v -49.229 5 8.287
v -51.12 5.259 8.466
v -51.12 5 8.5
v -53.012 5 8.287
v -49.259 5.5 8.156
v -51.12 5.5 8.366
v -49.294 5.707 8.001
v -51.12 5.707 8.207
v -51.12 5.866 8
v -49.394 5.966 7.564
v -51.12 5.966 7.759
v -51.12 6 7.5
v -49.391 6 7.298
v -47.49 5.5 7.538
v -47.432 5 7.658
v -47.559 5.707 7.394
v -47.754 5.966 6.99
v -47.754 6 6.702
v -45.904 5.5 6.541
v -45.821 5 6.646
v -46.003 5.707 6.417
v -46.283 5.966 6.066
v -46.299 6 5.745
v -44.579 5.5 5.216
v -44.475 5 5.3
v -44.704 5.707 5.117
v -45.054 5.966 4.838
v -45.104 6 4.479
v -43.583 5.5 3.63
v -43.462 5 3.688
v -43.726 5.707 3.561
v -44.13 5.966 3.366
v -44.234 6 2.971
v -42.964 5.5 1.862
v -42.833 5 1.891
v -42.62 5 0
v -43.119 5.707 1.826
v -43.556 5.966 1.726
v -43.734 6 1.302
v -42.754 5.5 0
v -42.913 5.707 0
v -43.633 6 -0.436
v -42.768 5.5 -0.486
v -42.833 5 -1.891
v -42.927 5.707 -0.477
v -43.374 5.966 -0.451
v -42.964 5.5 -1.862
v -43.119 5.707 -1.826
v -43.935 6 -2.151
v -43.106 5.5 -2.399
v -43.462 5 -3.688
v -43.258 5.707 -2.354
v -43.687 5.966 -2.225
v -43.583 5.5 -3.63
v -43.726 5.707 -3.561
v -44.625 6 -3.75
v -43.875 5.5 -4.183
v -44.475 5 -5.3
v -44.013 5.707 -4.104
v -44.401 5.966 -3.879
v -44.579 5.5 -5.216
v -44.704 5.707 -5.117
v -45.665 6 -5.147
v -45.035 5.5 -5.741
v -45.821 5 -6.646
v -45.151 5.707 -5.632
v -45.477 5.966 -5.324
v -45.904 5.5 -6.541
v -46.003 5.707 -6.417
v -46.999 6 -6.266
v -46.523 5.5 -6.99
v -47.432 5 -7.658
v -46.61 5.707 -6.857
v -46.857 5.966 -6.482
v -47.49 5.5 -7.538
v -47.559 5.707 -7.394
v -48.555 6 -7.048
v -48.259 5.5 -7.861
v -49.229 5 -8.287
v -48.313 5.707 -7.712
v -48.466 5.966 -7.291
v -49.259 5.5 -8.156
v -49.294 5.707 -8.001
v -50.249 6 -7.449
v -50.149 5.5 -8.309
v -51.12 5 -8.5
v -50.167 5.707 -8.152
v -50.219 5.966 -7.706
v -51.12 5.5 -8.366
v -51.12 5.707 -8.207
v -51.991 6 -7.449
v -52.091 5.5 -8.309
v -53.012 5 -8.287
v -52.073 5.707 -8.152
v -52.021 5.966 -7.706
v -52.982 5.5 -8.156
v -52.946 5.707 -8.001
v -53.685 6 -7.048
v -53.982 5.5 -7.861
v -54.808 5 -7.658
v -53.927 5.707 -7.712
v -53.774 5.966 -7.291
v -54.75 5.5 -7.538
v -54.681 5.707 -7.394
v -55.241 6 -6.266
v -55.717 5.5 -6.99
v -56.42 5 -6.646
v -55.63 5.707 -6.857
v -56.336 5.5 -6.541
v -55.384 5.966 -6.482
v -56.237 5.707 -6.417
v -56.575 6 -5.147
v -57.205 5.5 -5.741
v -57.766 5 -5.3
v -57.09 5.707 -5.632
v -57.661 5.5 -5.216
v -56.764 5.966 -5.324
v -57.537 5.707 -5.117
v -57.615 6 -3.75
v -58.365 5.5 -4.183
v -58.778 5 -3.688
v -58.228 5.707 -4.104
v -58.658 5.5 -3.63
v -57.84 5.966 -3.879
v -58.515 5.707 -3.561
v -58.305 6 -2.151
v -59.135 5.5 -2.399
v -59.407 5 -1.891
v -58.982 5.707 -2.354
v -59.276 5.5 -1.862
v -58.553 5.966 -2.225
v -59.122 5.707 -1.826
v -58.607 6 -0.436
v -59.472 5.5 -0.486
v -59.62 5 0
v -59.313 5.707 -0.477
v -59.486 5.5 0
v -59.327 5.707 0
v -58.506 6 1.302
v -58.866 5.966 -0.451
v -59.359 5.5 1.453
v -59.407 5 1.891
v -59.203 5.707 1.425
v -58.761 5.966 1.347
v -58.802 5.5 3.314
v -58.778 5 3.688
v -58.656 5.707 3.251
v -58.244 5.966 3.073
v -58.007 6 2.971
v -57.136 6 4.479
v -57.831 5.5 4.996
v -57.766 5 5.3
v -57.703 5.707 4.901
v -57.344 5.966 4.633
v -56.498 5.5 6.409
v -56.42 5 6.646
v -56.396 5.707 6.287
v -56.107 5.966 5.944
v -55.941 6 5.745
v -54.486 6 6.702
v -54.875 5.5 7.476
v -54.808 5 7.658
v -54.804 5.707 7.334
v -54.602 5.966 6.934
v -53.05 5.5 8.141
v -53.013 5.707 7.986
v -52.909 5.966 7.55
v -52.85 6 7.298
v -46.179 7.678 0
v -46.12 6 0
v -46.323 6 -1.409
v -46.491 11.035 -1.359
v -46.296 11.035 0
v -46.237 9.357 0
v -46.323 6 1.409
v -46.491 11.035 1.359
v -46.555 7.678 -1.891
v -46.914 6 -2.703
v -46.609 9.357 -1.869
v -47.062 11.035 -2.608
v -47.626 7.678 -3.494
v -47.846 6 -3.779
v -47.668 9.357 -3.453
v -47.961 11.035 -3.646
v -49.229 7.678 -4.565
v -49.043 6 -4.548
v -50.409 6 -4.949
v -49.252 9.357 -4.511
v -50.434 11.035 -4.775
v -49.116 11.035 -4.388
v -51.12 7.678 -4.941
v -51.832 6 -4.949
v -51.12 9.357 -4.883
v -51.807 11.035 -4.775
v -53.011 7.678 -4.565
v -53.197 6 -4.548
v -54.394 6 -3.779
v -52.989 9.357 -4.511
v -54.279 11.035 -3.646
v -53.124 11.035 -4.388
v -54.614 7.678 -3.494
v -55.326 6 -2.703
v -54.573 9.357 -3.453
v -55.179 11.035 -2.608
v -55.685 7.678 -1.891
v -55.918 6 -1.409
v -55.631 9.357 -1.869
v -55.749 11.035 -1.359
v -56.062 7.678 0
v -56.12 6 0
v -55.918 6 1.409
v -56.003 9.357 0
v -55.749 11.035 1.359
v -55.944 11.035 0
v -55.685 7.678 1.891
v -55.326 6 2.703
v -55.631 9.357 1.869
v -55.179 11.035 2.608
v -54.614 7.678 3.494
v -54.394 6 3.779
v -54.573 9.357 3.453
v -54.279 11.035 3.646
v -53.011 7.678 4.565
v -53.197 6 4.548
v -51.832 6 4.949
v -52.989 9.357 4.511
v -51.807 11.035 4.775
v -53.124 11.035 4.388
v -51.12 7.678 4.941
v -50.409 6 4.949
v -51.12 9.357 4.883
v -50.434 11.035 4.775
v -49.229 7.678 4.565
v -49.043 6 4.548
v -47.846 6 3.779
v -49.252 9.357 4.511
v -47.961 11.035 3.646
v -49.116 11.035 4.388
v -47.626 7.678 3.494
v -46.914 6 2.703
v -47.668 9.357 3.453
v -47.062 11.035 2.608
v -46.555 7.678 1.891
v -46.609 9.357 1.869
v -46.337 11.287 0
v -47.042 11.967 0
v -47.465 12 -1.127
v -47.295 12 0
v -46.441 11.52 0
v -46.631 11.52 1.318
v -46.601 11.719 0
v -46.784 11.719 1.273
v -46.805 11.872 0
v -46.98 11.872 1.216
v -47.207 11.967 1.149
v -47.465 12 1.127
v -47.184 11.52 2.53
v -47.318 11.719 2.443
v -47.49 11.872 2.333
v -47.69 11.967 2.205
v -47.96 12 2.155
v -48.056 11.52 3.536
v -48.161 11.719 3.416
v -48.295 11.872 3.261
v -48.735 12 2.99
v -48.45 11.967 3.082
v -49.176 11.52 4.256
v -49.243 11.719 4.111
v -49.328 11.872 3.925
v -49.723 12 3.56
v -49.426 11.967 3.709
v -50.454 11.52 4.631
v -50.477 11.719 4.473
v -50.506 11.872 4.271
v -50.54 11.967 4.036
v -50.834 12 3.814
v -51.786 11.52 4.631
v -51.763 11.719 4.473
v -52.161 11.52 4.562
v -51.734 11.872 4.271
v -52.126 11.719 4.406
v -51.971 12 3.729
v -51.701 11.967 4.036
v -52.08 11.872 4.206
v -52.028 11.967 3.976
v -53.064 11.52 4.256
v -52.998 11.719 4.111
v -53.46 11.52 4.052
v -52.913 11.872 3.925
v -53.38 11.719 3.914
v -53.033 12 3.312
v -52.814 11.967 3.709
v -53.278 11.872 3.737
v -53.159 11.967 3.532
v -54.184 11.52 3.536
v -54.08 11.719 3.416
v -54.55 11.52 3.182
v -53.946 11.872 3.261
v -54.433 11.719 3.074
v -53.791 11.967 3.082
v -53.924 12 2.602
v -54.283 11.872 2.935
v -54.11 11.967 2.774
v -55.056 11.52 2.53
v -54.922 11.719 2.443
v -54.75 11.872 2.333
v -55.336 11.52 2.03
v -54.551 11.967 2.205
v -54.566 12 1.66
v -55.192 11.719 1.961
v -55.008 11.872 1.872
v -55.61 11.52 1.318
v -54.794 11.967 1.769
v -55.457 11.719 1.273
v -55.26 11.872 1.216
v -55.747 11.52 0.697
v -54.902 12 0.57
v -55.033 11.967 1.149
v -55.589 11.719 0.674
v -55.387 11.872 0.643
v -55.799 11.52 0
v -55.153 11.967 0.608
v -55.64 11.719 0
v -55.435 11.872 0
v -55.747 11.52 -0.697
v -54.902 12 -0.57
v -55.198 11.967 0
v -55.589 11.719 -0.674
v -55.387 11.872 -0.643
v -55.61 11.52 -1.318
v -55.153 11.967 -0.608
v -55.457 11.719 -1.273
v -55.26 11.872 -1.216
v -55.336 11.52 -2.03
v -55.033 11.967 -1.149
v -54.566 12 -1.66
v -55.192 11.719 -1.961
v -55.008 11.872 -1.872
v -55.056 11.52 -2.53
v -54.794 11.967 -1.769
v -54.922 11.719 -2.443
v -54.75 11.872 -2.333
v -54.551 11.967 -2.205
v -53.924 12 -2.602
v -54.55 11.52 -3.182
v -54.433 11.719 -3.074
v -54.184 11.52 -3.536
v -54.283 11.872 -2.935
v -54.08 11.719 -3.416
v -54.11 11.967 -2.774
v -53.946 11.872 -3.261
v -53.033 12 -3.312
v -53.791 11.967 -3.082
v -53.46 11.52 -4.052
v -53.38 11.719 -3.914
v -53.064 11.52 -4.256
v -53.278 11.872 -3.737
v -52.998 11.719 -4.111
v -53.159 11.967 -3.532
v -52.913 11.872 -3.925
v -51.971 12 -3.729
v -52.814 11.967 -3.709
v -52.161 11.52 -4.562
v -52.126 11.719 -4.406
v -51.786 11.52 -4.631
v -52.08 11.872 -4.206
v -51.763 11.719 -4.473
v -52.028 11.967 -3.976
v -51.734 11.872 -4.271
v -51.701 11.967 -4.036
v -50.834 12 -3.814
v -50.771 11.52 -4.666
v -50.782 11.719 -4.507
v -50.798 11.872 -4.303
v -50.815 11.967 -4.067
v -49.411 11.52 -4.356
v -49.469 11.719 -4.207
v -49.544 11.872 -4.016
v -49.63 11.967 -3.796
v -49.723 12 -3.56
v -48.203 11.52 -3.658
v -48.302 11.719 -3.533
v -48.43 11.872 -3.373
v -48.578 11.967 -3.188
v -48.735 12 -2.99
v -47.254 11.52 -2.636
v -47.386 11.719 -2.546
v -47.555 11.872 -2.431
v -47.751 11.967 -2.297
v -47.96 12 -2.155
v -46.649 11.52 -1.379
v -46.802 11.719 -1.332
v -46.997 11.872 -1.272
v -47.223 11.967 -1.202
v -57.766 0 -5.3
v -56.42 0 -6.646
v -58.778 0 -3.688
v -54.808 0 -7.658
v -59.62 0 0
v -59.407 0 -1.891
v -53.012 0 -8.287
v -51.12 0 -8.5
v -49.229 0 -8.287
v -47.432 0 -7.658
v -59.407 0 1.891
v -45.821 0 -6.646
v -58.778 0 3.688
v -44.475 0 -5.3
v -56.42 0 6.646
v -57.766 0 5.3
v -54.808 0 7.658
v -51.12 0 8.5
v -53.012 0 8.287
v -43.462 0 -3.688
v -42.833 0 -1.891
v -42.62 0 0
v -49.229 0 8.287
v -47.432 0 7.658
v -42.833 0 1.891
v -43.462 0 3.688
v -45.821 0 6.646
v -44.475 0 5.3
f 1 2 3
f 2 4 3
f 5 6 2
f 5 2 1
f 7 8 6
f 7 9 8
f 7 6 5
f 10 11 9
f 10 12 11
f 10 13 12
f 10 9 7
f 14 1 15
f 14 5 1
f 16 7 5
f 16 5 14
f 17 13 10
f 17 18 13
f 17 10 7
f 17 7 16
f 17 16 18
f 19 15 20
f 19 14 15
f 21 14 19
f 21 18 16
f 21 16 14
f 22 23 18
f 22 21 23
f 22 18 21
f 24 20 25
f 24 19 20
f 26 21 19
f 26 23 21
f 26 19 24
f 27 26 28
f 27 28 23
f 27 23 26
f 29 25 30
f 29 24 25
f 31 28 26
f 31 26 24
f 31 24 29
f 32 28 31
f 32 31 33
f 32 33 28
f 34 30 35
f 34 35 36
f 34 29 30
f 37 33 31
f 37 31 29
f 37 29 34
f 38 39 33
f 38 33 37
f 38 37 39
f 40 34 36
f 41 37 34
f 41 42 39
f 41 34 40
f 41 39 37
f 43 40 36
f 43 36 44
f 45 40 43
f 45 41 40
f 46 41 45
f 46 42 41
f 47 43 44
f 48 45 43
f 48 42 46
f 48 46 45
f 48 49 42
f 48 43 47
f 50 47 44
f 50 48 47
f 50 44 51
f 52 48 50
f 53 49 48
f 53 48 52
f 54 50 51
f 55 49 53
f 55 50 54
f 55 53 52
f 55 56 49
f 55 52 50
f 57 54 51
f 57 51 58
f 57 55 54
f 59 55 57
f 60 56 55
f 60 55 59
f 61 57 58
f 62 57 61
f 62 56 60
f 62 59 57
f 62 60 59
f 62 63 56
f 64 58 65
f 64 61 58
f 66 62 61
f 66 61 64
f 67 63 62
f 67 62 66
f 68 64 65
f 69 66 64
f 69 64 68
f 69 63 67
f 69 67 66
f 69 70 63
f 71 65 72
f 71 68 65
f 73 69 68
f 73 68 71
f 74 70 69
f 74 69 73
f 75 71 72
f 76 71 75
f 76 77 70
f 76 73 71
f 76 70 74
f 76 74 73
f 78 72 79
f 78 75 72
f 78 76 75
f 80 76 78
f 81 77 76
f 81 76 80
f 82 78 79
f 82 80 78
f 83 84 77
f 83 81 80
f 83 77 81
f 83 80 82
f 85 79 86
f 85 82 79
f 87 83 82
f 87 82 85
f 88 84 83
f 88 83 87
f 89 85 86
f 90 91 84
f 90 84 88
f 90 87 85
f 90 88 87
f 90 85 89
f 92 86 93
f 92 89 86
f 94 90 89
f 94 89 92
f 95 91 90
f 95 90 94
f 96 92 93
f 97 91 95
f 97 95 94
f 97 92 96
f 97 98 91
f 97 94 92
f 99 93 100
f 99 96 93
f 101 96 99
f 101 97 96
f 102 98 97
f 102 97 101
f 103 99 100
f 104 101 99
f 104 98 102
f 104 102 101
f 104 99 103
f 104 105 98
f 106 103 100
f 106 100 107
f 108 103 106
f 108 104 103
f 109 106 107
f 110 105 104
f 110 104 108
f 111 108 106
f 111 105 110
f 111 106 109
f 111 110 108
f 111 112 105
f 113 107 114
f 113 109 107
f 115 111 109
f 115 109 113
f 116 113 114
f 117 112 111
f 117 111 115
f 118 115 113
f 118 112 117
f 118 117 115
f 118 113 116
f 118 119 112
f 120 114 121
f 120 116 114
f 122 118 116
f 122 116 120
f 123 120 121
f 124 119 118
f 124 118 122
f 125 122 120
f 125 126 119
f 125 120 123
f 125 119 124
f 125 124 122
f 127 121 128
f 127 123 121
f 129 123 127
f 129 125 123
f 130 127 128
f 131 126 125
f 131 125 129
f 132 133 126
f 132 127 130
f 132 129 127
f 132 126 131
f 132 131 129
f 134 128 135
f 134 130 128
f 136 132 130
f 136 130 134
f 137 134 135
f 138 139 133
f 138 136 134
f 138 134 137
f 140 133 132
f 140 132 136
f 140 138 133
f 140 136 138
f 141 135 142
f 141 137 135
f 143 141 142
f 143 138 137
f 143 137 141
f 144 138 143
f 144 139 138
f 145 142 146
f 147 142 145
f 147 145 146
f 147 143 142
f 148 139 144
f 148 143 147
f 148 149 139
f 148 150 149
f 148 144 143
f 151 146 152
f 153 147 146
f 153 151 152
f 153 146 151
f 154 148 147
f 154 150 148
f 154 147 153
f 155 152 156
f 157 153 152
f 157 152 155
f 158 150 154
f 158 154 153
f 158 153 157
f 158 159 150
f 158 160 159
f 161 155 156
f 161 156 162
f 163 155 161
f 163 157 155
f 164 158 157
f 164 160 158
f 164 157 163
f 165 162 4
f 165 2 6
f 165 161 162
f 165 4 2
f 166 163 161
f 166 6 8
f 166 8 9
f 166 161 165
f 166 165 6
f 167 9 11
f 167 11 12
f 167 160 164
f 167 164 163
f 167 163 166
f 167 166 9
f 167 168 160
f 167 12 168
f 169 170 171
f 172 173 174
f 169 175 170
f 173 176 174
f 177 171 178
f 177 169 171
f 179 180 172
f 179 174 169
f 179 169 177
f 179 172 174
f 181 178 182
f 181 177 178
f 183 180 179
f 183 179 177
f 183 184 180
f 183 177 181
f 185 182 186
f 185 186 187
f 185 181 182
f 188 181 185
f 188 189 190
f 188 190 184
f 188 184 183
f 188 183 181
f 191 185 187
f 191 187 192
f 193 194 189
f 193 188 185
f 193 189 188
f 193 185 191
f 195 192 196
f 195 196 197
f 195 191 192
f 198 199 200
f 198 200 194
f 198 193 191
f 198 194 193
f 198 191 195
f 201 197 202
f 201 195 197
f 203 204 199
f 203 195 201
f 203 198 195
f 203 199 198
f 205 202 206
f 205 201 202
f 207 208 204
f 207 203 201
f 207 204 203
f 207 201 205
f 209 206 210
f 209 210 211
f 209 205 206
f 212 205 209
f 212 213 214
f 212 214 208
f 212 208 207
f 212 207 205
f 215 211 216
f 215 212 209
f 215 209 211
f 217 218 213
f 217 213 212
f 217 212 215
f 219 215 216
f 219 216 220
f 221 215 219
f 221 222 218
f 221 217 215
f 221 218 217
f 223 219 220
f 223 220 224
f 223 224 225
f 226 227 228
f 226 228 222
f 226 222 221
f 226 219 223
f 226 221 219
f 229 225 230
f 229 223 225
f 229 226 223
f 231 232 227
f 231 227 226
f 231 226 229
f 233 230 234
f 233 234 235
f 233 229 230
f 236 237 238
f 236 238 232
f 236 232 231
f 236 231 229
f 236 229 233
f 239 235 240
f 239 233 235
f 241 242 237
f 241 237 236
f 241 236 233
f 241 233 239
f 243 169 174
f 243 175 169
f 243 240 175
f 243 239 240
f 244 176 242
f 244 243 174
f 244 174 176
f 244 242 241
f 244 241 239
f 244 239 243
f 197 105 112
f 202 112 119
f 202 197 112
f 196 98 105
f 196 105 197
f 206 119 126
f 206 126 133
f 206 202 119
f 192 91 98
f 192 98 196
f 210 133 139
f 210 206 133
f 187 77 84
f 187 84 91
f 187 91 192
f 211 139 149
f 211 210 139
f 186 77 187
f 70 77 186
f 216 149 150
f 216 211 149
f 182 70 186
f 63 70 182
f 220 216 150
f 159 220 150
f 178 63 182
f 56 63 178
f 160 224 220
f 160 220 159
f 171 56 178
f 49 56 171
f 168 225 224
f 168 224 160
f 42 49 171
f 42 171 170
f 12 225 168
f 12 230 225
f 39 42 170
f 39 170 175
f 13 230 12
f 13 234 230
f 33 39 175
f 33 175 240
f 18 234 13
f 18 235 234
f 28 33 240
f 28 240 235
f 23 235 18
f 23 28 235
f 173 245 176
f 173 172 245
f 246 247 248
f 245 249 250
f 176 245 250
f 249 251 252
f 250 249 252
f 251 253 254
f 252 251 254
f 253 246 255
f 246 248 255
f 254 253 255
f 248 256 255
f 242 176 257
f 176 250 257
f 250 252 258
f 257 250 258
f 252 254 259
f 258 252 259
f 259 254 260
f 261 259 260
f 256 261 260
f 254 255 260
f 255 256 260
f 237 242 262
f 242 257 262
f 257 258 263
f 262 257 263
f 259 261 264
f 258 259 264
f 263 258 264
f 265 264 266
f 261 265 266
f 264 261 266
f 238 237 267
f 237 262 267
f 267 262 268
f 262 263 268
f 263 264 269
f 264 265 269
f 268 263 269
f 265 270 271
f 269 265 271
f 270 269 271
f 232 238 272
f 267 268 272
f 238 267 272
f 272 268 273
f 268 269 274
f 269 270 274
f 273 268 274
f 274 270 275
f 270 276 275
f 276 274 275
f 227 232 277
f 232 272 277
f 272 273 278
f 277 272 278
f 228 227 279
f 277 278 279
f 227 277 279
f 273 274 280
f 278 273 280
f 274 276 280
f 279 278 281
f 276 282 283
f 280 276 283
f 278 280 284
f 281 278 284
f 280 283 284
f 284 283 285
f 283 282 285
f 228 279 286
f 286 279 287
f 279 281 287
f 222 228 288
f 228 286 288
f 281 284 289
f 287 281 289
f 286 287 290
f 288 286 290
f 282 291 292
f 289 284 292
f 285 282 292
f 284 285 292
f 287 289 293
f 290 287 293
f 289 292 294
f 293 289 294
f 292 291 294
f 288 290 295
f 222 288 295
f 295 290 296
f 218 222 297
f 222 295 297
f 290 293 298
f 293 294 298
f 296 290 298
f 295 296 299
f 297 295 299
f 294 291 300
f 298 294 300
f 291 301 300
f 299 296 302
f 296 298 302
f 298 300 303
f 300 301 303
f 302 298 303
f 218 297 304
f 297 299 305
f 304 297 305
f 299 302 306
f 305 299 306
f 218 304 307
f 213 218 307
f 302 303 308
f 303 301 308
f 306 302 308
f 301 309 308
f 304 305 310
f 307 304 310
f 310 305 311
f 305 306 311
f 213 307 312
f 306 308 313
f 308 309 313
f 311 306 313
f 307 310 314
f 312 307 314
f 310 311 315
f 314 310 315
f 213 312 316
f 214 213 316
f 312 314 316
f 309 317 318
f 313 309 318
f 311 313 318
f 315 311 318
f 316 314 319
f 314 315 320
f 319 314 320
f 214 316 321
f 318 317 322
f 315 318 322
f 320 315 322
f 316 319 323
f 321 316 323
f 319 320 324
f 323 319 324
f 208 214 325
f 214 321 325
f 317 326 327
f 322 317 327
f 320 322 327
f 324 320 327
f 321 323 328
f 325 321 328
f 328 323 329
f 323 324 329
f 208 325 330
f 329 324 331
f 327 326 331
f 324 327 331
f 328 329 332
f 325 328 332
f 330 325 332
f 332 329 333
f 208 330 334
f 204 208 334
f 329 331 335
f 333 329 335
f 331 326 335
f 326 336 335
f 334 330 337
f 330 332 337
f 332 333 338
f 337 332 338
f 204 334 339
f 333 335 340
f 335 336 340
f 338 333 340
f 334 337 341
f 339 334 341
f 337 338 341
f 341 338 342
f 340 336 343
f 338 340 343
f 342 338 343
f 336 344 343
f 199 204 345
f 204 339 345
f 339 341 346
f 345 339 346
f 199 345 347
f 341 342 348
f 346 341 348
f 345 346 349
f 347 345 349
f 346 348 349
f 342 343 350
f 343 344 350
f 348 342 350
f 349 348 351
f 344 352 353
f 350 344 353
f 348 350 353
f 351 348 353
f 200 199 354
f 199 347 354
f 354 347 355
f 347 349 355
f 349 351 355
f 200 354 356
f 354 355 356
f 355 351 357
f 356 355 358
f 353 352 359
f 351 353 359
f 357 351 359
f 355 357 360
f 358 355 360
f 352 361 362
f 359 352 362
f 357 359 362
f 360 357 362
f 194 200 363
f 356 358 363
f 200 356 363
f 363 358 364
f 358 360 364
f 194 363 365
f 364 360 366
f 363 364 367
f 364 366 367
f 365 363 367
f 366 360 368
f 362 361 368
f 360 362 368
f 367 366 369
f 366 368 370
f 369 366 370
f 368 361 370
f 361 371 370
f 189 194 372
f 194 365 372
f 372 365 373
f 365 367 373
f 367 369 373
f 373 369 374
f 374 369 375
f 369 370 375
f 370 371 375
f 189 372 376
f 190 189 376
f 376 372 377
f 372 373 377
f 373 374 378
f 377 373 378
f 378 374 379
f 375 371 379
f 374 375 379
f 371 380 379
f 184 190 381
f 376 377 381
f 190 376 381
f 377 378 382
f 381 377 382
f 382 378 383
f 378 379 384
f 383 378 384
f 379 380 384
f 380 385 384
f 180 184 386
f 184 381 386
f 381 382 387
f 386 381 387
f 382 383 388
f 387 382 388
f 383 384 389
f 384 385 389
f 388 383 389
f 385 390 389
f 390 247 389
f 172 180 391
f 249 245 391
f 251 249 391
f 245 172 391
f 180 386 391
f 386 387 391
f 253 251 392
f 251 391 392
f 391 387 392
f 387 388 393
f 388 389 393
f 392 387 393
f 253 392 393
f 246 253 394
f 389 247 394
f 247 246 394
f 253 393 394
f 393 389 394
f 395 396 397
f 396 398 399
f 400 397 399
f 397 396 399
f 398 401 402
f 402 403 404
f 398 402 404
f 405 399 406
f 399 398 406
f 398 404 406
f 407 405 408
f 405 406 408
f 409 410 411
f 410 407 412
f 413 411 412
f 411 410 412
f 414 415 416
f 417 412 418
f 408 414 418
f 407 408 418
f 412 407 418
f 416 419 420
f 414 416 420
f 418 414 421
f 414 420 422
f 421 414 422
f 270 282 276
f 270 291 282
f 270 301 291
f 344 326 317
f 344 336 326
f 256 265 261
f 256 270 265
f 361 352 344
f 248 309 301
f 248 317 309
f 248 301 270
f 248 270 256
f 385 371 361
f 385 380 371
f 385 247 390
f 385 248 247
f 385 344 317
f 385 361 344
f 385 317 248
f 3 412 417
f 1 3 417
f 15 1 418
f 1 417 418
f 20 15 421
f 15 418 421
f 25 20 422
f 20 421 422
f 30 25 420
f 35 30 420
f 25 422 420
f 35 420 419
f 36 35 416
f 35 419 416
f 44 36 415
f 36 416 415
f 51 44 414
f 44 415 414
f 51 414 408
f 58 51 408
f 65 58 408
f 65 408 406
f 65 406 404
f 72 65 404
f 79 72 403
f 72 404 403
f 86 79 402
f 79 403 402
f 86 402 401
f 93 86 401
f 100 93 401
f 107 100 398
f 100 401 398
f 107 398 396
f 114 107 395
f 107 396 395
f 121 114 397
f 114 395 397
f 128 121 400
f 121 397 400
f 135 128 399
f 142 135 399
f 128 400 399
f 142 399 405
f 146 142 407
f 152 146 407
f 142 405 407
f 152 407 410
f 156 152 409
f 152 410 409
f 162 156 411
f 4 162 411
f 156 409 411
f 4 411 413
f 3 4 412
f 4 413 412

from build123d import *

# Parameters (mm, degrees)
SKETCH1_R           = 8.5
BOSS_EXTRUDE1_DEPTH = 6
FILLET2_R           = 1
SKETCH2_R           = 5
BOSS_EXTRUDE3_DEPTH = 6
BOSS_EXTRUDE3_TAPER = 2
FILLET4_R           = 1


with BuildPart() as part:
    # Sketch1 → Boss-Extrude1 (new body)
    with BuildSketch(Plane(origin=(0, 0, 0), x_dir=(1, 0, 0), z_dir=(0, 1, 0))):
        with Locations(Location((-51.120170416, 0, 0), (0, 0, 270))):
            Circle(SKETCH1_R)
    extrude(amount=BOSS_EXTRUDE1_DEPTH)

    # Fillet2
    fillet2_edges = [part.edges().sort_by_distance(p)[0] for p in [
        (-51.120170416, 6, -8.5),
    ]]
    fillet(fillet2_edges, radius=FILLET2_R)

    # Sketch2 → Boss-Extrude3 (add)
    with BuildSketch(Plane(origin=(0, 6, 0), x_dir=(1, 0, 0), z_dir=(0, 1, 0))):
        with Locations((-51.120170416, 0)):
            Circle(SKETCH2_R)
    extrude(amount=BOSS_EXTRUDE3_DEPTH, taper=BOSS_EXTRUDE3_TAPER)

    # Fillet4
    fillet4_edges = [part.edges().sort_by_distance(p)[0] for p in [
        (-55.9106458, 12, 0),
    ]]
    fillet(fillet4_edges, radius=FILLET4_R)


solid = part.part
